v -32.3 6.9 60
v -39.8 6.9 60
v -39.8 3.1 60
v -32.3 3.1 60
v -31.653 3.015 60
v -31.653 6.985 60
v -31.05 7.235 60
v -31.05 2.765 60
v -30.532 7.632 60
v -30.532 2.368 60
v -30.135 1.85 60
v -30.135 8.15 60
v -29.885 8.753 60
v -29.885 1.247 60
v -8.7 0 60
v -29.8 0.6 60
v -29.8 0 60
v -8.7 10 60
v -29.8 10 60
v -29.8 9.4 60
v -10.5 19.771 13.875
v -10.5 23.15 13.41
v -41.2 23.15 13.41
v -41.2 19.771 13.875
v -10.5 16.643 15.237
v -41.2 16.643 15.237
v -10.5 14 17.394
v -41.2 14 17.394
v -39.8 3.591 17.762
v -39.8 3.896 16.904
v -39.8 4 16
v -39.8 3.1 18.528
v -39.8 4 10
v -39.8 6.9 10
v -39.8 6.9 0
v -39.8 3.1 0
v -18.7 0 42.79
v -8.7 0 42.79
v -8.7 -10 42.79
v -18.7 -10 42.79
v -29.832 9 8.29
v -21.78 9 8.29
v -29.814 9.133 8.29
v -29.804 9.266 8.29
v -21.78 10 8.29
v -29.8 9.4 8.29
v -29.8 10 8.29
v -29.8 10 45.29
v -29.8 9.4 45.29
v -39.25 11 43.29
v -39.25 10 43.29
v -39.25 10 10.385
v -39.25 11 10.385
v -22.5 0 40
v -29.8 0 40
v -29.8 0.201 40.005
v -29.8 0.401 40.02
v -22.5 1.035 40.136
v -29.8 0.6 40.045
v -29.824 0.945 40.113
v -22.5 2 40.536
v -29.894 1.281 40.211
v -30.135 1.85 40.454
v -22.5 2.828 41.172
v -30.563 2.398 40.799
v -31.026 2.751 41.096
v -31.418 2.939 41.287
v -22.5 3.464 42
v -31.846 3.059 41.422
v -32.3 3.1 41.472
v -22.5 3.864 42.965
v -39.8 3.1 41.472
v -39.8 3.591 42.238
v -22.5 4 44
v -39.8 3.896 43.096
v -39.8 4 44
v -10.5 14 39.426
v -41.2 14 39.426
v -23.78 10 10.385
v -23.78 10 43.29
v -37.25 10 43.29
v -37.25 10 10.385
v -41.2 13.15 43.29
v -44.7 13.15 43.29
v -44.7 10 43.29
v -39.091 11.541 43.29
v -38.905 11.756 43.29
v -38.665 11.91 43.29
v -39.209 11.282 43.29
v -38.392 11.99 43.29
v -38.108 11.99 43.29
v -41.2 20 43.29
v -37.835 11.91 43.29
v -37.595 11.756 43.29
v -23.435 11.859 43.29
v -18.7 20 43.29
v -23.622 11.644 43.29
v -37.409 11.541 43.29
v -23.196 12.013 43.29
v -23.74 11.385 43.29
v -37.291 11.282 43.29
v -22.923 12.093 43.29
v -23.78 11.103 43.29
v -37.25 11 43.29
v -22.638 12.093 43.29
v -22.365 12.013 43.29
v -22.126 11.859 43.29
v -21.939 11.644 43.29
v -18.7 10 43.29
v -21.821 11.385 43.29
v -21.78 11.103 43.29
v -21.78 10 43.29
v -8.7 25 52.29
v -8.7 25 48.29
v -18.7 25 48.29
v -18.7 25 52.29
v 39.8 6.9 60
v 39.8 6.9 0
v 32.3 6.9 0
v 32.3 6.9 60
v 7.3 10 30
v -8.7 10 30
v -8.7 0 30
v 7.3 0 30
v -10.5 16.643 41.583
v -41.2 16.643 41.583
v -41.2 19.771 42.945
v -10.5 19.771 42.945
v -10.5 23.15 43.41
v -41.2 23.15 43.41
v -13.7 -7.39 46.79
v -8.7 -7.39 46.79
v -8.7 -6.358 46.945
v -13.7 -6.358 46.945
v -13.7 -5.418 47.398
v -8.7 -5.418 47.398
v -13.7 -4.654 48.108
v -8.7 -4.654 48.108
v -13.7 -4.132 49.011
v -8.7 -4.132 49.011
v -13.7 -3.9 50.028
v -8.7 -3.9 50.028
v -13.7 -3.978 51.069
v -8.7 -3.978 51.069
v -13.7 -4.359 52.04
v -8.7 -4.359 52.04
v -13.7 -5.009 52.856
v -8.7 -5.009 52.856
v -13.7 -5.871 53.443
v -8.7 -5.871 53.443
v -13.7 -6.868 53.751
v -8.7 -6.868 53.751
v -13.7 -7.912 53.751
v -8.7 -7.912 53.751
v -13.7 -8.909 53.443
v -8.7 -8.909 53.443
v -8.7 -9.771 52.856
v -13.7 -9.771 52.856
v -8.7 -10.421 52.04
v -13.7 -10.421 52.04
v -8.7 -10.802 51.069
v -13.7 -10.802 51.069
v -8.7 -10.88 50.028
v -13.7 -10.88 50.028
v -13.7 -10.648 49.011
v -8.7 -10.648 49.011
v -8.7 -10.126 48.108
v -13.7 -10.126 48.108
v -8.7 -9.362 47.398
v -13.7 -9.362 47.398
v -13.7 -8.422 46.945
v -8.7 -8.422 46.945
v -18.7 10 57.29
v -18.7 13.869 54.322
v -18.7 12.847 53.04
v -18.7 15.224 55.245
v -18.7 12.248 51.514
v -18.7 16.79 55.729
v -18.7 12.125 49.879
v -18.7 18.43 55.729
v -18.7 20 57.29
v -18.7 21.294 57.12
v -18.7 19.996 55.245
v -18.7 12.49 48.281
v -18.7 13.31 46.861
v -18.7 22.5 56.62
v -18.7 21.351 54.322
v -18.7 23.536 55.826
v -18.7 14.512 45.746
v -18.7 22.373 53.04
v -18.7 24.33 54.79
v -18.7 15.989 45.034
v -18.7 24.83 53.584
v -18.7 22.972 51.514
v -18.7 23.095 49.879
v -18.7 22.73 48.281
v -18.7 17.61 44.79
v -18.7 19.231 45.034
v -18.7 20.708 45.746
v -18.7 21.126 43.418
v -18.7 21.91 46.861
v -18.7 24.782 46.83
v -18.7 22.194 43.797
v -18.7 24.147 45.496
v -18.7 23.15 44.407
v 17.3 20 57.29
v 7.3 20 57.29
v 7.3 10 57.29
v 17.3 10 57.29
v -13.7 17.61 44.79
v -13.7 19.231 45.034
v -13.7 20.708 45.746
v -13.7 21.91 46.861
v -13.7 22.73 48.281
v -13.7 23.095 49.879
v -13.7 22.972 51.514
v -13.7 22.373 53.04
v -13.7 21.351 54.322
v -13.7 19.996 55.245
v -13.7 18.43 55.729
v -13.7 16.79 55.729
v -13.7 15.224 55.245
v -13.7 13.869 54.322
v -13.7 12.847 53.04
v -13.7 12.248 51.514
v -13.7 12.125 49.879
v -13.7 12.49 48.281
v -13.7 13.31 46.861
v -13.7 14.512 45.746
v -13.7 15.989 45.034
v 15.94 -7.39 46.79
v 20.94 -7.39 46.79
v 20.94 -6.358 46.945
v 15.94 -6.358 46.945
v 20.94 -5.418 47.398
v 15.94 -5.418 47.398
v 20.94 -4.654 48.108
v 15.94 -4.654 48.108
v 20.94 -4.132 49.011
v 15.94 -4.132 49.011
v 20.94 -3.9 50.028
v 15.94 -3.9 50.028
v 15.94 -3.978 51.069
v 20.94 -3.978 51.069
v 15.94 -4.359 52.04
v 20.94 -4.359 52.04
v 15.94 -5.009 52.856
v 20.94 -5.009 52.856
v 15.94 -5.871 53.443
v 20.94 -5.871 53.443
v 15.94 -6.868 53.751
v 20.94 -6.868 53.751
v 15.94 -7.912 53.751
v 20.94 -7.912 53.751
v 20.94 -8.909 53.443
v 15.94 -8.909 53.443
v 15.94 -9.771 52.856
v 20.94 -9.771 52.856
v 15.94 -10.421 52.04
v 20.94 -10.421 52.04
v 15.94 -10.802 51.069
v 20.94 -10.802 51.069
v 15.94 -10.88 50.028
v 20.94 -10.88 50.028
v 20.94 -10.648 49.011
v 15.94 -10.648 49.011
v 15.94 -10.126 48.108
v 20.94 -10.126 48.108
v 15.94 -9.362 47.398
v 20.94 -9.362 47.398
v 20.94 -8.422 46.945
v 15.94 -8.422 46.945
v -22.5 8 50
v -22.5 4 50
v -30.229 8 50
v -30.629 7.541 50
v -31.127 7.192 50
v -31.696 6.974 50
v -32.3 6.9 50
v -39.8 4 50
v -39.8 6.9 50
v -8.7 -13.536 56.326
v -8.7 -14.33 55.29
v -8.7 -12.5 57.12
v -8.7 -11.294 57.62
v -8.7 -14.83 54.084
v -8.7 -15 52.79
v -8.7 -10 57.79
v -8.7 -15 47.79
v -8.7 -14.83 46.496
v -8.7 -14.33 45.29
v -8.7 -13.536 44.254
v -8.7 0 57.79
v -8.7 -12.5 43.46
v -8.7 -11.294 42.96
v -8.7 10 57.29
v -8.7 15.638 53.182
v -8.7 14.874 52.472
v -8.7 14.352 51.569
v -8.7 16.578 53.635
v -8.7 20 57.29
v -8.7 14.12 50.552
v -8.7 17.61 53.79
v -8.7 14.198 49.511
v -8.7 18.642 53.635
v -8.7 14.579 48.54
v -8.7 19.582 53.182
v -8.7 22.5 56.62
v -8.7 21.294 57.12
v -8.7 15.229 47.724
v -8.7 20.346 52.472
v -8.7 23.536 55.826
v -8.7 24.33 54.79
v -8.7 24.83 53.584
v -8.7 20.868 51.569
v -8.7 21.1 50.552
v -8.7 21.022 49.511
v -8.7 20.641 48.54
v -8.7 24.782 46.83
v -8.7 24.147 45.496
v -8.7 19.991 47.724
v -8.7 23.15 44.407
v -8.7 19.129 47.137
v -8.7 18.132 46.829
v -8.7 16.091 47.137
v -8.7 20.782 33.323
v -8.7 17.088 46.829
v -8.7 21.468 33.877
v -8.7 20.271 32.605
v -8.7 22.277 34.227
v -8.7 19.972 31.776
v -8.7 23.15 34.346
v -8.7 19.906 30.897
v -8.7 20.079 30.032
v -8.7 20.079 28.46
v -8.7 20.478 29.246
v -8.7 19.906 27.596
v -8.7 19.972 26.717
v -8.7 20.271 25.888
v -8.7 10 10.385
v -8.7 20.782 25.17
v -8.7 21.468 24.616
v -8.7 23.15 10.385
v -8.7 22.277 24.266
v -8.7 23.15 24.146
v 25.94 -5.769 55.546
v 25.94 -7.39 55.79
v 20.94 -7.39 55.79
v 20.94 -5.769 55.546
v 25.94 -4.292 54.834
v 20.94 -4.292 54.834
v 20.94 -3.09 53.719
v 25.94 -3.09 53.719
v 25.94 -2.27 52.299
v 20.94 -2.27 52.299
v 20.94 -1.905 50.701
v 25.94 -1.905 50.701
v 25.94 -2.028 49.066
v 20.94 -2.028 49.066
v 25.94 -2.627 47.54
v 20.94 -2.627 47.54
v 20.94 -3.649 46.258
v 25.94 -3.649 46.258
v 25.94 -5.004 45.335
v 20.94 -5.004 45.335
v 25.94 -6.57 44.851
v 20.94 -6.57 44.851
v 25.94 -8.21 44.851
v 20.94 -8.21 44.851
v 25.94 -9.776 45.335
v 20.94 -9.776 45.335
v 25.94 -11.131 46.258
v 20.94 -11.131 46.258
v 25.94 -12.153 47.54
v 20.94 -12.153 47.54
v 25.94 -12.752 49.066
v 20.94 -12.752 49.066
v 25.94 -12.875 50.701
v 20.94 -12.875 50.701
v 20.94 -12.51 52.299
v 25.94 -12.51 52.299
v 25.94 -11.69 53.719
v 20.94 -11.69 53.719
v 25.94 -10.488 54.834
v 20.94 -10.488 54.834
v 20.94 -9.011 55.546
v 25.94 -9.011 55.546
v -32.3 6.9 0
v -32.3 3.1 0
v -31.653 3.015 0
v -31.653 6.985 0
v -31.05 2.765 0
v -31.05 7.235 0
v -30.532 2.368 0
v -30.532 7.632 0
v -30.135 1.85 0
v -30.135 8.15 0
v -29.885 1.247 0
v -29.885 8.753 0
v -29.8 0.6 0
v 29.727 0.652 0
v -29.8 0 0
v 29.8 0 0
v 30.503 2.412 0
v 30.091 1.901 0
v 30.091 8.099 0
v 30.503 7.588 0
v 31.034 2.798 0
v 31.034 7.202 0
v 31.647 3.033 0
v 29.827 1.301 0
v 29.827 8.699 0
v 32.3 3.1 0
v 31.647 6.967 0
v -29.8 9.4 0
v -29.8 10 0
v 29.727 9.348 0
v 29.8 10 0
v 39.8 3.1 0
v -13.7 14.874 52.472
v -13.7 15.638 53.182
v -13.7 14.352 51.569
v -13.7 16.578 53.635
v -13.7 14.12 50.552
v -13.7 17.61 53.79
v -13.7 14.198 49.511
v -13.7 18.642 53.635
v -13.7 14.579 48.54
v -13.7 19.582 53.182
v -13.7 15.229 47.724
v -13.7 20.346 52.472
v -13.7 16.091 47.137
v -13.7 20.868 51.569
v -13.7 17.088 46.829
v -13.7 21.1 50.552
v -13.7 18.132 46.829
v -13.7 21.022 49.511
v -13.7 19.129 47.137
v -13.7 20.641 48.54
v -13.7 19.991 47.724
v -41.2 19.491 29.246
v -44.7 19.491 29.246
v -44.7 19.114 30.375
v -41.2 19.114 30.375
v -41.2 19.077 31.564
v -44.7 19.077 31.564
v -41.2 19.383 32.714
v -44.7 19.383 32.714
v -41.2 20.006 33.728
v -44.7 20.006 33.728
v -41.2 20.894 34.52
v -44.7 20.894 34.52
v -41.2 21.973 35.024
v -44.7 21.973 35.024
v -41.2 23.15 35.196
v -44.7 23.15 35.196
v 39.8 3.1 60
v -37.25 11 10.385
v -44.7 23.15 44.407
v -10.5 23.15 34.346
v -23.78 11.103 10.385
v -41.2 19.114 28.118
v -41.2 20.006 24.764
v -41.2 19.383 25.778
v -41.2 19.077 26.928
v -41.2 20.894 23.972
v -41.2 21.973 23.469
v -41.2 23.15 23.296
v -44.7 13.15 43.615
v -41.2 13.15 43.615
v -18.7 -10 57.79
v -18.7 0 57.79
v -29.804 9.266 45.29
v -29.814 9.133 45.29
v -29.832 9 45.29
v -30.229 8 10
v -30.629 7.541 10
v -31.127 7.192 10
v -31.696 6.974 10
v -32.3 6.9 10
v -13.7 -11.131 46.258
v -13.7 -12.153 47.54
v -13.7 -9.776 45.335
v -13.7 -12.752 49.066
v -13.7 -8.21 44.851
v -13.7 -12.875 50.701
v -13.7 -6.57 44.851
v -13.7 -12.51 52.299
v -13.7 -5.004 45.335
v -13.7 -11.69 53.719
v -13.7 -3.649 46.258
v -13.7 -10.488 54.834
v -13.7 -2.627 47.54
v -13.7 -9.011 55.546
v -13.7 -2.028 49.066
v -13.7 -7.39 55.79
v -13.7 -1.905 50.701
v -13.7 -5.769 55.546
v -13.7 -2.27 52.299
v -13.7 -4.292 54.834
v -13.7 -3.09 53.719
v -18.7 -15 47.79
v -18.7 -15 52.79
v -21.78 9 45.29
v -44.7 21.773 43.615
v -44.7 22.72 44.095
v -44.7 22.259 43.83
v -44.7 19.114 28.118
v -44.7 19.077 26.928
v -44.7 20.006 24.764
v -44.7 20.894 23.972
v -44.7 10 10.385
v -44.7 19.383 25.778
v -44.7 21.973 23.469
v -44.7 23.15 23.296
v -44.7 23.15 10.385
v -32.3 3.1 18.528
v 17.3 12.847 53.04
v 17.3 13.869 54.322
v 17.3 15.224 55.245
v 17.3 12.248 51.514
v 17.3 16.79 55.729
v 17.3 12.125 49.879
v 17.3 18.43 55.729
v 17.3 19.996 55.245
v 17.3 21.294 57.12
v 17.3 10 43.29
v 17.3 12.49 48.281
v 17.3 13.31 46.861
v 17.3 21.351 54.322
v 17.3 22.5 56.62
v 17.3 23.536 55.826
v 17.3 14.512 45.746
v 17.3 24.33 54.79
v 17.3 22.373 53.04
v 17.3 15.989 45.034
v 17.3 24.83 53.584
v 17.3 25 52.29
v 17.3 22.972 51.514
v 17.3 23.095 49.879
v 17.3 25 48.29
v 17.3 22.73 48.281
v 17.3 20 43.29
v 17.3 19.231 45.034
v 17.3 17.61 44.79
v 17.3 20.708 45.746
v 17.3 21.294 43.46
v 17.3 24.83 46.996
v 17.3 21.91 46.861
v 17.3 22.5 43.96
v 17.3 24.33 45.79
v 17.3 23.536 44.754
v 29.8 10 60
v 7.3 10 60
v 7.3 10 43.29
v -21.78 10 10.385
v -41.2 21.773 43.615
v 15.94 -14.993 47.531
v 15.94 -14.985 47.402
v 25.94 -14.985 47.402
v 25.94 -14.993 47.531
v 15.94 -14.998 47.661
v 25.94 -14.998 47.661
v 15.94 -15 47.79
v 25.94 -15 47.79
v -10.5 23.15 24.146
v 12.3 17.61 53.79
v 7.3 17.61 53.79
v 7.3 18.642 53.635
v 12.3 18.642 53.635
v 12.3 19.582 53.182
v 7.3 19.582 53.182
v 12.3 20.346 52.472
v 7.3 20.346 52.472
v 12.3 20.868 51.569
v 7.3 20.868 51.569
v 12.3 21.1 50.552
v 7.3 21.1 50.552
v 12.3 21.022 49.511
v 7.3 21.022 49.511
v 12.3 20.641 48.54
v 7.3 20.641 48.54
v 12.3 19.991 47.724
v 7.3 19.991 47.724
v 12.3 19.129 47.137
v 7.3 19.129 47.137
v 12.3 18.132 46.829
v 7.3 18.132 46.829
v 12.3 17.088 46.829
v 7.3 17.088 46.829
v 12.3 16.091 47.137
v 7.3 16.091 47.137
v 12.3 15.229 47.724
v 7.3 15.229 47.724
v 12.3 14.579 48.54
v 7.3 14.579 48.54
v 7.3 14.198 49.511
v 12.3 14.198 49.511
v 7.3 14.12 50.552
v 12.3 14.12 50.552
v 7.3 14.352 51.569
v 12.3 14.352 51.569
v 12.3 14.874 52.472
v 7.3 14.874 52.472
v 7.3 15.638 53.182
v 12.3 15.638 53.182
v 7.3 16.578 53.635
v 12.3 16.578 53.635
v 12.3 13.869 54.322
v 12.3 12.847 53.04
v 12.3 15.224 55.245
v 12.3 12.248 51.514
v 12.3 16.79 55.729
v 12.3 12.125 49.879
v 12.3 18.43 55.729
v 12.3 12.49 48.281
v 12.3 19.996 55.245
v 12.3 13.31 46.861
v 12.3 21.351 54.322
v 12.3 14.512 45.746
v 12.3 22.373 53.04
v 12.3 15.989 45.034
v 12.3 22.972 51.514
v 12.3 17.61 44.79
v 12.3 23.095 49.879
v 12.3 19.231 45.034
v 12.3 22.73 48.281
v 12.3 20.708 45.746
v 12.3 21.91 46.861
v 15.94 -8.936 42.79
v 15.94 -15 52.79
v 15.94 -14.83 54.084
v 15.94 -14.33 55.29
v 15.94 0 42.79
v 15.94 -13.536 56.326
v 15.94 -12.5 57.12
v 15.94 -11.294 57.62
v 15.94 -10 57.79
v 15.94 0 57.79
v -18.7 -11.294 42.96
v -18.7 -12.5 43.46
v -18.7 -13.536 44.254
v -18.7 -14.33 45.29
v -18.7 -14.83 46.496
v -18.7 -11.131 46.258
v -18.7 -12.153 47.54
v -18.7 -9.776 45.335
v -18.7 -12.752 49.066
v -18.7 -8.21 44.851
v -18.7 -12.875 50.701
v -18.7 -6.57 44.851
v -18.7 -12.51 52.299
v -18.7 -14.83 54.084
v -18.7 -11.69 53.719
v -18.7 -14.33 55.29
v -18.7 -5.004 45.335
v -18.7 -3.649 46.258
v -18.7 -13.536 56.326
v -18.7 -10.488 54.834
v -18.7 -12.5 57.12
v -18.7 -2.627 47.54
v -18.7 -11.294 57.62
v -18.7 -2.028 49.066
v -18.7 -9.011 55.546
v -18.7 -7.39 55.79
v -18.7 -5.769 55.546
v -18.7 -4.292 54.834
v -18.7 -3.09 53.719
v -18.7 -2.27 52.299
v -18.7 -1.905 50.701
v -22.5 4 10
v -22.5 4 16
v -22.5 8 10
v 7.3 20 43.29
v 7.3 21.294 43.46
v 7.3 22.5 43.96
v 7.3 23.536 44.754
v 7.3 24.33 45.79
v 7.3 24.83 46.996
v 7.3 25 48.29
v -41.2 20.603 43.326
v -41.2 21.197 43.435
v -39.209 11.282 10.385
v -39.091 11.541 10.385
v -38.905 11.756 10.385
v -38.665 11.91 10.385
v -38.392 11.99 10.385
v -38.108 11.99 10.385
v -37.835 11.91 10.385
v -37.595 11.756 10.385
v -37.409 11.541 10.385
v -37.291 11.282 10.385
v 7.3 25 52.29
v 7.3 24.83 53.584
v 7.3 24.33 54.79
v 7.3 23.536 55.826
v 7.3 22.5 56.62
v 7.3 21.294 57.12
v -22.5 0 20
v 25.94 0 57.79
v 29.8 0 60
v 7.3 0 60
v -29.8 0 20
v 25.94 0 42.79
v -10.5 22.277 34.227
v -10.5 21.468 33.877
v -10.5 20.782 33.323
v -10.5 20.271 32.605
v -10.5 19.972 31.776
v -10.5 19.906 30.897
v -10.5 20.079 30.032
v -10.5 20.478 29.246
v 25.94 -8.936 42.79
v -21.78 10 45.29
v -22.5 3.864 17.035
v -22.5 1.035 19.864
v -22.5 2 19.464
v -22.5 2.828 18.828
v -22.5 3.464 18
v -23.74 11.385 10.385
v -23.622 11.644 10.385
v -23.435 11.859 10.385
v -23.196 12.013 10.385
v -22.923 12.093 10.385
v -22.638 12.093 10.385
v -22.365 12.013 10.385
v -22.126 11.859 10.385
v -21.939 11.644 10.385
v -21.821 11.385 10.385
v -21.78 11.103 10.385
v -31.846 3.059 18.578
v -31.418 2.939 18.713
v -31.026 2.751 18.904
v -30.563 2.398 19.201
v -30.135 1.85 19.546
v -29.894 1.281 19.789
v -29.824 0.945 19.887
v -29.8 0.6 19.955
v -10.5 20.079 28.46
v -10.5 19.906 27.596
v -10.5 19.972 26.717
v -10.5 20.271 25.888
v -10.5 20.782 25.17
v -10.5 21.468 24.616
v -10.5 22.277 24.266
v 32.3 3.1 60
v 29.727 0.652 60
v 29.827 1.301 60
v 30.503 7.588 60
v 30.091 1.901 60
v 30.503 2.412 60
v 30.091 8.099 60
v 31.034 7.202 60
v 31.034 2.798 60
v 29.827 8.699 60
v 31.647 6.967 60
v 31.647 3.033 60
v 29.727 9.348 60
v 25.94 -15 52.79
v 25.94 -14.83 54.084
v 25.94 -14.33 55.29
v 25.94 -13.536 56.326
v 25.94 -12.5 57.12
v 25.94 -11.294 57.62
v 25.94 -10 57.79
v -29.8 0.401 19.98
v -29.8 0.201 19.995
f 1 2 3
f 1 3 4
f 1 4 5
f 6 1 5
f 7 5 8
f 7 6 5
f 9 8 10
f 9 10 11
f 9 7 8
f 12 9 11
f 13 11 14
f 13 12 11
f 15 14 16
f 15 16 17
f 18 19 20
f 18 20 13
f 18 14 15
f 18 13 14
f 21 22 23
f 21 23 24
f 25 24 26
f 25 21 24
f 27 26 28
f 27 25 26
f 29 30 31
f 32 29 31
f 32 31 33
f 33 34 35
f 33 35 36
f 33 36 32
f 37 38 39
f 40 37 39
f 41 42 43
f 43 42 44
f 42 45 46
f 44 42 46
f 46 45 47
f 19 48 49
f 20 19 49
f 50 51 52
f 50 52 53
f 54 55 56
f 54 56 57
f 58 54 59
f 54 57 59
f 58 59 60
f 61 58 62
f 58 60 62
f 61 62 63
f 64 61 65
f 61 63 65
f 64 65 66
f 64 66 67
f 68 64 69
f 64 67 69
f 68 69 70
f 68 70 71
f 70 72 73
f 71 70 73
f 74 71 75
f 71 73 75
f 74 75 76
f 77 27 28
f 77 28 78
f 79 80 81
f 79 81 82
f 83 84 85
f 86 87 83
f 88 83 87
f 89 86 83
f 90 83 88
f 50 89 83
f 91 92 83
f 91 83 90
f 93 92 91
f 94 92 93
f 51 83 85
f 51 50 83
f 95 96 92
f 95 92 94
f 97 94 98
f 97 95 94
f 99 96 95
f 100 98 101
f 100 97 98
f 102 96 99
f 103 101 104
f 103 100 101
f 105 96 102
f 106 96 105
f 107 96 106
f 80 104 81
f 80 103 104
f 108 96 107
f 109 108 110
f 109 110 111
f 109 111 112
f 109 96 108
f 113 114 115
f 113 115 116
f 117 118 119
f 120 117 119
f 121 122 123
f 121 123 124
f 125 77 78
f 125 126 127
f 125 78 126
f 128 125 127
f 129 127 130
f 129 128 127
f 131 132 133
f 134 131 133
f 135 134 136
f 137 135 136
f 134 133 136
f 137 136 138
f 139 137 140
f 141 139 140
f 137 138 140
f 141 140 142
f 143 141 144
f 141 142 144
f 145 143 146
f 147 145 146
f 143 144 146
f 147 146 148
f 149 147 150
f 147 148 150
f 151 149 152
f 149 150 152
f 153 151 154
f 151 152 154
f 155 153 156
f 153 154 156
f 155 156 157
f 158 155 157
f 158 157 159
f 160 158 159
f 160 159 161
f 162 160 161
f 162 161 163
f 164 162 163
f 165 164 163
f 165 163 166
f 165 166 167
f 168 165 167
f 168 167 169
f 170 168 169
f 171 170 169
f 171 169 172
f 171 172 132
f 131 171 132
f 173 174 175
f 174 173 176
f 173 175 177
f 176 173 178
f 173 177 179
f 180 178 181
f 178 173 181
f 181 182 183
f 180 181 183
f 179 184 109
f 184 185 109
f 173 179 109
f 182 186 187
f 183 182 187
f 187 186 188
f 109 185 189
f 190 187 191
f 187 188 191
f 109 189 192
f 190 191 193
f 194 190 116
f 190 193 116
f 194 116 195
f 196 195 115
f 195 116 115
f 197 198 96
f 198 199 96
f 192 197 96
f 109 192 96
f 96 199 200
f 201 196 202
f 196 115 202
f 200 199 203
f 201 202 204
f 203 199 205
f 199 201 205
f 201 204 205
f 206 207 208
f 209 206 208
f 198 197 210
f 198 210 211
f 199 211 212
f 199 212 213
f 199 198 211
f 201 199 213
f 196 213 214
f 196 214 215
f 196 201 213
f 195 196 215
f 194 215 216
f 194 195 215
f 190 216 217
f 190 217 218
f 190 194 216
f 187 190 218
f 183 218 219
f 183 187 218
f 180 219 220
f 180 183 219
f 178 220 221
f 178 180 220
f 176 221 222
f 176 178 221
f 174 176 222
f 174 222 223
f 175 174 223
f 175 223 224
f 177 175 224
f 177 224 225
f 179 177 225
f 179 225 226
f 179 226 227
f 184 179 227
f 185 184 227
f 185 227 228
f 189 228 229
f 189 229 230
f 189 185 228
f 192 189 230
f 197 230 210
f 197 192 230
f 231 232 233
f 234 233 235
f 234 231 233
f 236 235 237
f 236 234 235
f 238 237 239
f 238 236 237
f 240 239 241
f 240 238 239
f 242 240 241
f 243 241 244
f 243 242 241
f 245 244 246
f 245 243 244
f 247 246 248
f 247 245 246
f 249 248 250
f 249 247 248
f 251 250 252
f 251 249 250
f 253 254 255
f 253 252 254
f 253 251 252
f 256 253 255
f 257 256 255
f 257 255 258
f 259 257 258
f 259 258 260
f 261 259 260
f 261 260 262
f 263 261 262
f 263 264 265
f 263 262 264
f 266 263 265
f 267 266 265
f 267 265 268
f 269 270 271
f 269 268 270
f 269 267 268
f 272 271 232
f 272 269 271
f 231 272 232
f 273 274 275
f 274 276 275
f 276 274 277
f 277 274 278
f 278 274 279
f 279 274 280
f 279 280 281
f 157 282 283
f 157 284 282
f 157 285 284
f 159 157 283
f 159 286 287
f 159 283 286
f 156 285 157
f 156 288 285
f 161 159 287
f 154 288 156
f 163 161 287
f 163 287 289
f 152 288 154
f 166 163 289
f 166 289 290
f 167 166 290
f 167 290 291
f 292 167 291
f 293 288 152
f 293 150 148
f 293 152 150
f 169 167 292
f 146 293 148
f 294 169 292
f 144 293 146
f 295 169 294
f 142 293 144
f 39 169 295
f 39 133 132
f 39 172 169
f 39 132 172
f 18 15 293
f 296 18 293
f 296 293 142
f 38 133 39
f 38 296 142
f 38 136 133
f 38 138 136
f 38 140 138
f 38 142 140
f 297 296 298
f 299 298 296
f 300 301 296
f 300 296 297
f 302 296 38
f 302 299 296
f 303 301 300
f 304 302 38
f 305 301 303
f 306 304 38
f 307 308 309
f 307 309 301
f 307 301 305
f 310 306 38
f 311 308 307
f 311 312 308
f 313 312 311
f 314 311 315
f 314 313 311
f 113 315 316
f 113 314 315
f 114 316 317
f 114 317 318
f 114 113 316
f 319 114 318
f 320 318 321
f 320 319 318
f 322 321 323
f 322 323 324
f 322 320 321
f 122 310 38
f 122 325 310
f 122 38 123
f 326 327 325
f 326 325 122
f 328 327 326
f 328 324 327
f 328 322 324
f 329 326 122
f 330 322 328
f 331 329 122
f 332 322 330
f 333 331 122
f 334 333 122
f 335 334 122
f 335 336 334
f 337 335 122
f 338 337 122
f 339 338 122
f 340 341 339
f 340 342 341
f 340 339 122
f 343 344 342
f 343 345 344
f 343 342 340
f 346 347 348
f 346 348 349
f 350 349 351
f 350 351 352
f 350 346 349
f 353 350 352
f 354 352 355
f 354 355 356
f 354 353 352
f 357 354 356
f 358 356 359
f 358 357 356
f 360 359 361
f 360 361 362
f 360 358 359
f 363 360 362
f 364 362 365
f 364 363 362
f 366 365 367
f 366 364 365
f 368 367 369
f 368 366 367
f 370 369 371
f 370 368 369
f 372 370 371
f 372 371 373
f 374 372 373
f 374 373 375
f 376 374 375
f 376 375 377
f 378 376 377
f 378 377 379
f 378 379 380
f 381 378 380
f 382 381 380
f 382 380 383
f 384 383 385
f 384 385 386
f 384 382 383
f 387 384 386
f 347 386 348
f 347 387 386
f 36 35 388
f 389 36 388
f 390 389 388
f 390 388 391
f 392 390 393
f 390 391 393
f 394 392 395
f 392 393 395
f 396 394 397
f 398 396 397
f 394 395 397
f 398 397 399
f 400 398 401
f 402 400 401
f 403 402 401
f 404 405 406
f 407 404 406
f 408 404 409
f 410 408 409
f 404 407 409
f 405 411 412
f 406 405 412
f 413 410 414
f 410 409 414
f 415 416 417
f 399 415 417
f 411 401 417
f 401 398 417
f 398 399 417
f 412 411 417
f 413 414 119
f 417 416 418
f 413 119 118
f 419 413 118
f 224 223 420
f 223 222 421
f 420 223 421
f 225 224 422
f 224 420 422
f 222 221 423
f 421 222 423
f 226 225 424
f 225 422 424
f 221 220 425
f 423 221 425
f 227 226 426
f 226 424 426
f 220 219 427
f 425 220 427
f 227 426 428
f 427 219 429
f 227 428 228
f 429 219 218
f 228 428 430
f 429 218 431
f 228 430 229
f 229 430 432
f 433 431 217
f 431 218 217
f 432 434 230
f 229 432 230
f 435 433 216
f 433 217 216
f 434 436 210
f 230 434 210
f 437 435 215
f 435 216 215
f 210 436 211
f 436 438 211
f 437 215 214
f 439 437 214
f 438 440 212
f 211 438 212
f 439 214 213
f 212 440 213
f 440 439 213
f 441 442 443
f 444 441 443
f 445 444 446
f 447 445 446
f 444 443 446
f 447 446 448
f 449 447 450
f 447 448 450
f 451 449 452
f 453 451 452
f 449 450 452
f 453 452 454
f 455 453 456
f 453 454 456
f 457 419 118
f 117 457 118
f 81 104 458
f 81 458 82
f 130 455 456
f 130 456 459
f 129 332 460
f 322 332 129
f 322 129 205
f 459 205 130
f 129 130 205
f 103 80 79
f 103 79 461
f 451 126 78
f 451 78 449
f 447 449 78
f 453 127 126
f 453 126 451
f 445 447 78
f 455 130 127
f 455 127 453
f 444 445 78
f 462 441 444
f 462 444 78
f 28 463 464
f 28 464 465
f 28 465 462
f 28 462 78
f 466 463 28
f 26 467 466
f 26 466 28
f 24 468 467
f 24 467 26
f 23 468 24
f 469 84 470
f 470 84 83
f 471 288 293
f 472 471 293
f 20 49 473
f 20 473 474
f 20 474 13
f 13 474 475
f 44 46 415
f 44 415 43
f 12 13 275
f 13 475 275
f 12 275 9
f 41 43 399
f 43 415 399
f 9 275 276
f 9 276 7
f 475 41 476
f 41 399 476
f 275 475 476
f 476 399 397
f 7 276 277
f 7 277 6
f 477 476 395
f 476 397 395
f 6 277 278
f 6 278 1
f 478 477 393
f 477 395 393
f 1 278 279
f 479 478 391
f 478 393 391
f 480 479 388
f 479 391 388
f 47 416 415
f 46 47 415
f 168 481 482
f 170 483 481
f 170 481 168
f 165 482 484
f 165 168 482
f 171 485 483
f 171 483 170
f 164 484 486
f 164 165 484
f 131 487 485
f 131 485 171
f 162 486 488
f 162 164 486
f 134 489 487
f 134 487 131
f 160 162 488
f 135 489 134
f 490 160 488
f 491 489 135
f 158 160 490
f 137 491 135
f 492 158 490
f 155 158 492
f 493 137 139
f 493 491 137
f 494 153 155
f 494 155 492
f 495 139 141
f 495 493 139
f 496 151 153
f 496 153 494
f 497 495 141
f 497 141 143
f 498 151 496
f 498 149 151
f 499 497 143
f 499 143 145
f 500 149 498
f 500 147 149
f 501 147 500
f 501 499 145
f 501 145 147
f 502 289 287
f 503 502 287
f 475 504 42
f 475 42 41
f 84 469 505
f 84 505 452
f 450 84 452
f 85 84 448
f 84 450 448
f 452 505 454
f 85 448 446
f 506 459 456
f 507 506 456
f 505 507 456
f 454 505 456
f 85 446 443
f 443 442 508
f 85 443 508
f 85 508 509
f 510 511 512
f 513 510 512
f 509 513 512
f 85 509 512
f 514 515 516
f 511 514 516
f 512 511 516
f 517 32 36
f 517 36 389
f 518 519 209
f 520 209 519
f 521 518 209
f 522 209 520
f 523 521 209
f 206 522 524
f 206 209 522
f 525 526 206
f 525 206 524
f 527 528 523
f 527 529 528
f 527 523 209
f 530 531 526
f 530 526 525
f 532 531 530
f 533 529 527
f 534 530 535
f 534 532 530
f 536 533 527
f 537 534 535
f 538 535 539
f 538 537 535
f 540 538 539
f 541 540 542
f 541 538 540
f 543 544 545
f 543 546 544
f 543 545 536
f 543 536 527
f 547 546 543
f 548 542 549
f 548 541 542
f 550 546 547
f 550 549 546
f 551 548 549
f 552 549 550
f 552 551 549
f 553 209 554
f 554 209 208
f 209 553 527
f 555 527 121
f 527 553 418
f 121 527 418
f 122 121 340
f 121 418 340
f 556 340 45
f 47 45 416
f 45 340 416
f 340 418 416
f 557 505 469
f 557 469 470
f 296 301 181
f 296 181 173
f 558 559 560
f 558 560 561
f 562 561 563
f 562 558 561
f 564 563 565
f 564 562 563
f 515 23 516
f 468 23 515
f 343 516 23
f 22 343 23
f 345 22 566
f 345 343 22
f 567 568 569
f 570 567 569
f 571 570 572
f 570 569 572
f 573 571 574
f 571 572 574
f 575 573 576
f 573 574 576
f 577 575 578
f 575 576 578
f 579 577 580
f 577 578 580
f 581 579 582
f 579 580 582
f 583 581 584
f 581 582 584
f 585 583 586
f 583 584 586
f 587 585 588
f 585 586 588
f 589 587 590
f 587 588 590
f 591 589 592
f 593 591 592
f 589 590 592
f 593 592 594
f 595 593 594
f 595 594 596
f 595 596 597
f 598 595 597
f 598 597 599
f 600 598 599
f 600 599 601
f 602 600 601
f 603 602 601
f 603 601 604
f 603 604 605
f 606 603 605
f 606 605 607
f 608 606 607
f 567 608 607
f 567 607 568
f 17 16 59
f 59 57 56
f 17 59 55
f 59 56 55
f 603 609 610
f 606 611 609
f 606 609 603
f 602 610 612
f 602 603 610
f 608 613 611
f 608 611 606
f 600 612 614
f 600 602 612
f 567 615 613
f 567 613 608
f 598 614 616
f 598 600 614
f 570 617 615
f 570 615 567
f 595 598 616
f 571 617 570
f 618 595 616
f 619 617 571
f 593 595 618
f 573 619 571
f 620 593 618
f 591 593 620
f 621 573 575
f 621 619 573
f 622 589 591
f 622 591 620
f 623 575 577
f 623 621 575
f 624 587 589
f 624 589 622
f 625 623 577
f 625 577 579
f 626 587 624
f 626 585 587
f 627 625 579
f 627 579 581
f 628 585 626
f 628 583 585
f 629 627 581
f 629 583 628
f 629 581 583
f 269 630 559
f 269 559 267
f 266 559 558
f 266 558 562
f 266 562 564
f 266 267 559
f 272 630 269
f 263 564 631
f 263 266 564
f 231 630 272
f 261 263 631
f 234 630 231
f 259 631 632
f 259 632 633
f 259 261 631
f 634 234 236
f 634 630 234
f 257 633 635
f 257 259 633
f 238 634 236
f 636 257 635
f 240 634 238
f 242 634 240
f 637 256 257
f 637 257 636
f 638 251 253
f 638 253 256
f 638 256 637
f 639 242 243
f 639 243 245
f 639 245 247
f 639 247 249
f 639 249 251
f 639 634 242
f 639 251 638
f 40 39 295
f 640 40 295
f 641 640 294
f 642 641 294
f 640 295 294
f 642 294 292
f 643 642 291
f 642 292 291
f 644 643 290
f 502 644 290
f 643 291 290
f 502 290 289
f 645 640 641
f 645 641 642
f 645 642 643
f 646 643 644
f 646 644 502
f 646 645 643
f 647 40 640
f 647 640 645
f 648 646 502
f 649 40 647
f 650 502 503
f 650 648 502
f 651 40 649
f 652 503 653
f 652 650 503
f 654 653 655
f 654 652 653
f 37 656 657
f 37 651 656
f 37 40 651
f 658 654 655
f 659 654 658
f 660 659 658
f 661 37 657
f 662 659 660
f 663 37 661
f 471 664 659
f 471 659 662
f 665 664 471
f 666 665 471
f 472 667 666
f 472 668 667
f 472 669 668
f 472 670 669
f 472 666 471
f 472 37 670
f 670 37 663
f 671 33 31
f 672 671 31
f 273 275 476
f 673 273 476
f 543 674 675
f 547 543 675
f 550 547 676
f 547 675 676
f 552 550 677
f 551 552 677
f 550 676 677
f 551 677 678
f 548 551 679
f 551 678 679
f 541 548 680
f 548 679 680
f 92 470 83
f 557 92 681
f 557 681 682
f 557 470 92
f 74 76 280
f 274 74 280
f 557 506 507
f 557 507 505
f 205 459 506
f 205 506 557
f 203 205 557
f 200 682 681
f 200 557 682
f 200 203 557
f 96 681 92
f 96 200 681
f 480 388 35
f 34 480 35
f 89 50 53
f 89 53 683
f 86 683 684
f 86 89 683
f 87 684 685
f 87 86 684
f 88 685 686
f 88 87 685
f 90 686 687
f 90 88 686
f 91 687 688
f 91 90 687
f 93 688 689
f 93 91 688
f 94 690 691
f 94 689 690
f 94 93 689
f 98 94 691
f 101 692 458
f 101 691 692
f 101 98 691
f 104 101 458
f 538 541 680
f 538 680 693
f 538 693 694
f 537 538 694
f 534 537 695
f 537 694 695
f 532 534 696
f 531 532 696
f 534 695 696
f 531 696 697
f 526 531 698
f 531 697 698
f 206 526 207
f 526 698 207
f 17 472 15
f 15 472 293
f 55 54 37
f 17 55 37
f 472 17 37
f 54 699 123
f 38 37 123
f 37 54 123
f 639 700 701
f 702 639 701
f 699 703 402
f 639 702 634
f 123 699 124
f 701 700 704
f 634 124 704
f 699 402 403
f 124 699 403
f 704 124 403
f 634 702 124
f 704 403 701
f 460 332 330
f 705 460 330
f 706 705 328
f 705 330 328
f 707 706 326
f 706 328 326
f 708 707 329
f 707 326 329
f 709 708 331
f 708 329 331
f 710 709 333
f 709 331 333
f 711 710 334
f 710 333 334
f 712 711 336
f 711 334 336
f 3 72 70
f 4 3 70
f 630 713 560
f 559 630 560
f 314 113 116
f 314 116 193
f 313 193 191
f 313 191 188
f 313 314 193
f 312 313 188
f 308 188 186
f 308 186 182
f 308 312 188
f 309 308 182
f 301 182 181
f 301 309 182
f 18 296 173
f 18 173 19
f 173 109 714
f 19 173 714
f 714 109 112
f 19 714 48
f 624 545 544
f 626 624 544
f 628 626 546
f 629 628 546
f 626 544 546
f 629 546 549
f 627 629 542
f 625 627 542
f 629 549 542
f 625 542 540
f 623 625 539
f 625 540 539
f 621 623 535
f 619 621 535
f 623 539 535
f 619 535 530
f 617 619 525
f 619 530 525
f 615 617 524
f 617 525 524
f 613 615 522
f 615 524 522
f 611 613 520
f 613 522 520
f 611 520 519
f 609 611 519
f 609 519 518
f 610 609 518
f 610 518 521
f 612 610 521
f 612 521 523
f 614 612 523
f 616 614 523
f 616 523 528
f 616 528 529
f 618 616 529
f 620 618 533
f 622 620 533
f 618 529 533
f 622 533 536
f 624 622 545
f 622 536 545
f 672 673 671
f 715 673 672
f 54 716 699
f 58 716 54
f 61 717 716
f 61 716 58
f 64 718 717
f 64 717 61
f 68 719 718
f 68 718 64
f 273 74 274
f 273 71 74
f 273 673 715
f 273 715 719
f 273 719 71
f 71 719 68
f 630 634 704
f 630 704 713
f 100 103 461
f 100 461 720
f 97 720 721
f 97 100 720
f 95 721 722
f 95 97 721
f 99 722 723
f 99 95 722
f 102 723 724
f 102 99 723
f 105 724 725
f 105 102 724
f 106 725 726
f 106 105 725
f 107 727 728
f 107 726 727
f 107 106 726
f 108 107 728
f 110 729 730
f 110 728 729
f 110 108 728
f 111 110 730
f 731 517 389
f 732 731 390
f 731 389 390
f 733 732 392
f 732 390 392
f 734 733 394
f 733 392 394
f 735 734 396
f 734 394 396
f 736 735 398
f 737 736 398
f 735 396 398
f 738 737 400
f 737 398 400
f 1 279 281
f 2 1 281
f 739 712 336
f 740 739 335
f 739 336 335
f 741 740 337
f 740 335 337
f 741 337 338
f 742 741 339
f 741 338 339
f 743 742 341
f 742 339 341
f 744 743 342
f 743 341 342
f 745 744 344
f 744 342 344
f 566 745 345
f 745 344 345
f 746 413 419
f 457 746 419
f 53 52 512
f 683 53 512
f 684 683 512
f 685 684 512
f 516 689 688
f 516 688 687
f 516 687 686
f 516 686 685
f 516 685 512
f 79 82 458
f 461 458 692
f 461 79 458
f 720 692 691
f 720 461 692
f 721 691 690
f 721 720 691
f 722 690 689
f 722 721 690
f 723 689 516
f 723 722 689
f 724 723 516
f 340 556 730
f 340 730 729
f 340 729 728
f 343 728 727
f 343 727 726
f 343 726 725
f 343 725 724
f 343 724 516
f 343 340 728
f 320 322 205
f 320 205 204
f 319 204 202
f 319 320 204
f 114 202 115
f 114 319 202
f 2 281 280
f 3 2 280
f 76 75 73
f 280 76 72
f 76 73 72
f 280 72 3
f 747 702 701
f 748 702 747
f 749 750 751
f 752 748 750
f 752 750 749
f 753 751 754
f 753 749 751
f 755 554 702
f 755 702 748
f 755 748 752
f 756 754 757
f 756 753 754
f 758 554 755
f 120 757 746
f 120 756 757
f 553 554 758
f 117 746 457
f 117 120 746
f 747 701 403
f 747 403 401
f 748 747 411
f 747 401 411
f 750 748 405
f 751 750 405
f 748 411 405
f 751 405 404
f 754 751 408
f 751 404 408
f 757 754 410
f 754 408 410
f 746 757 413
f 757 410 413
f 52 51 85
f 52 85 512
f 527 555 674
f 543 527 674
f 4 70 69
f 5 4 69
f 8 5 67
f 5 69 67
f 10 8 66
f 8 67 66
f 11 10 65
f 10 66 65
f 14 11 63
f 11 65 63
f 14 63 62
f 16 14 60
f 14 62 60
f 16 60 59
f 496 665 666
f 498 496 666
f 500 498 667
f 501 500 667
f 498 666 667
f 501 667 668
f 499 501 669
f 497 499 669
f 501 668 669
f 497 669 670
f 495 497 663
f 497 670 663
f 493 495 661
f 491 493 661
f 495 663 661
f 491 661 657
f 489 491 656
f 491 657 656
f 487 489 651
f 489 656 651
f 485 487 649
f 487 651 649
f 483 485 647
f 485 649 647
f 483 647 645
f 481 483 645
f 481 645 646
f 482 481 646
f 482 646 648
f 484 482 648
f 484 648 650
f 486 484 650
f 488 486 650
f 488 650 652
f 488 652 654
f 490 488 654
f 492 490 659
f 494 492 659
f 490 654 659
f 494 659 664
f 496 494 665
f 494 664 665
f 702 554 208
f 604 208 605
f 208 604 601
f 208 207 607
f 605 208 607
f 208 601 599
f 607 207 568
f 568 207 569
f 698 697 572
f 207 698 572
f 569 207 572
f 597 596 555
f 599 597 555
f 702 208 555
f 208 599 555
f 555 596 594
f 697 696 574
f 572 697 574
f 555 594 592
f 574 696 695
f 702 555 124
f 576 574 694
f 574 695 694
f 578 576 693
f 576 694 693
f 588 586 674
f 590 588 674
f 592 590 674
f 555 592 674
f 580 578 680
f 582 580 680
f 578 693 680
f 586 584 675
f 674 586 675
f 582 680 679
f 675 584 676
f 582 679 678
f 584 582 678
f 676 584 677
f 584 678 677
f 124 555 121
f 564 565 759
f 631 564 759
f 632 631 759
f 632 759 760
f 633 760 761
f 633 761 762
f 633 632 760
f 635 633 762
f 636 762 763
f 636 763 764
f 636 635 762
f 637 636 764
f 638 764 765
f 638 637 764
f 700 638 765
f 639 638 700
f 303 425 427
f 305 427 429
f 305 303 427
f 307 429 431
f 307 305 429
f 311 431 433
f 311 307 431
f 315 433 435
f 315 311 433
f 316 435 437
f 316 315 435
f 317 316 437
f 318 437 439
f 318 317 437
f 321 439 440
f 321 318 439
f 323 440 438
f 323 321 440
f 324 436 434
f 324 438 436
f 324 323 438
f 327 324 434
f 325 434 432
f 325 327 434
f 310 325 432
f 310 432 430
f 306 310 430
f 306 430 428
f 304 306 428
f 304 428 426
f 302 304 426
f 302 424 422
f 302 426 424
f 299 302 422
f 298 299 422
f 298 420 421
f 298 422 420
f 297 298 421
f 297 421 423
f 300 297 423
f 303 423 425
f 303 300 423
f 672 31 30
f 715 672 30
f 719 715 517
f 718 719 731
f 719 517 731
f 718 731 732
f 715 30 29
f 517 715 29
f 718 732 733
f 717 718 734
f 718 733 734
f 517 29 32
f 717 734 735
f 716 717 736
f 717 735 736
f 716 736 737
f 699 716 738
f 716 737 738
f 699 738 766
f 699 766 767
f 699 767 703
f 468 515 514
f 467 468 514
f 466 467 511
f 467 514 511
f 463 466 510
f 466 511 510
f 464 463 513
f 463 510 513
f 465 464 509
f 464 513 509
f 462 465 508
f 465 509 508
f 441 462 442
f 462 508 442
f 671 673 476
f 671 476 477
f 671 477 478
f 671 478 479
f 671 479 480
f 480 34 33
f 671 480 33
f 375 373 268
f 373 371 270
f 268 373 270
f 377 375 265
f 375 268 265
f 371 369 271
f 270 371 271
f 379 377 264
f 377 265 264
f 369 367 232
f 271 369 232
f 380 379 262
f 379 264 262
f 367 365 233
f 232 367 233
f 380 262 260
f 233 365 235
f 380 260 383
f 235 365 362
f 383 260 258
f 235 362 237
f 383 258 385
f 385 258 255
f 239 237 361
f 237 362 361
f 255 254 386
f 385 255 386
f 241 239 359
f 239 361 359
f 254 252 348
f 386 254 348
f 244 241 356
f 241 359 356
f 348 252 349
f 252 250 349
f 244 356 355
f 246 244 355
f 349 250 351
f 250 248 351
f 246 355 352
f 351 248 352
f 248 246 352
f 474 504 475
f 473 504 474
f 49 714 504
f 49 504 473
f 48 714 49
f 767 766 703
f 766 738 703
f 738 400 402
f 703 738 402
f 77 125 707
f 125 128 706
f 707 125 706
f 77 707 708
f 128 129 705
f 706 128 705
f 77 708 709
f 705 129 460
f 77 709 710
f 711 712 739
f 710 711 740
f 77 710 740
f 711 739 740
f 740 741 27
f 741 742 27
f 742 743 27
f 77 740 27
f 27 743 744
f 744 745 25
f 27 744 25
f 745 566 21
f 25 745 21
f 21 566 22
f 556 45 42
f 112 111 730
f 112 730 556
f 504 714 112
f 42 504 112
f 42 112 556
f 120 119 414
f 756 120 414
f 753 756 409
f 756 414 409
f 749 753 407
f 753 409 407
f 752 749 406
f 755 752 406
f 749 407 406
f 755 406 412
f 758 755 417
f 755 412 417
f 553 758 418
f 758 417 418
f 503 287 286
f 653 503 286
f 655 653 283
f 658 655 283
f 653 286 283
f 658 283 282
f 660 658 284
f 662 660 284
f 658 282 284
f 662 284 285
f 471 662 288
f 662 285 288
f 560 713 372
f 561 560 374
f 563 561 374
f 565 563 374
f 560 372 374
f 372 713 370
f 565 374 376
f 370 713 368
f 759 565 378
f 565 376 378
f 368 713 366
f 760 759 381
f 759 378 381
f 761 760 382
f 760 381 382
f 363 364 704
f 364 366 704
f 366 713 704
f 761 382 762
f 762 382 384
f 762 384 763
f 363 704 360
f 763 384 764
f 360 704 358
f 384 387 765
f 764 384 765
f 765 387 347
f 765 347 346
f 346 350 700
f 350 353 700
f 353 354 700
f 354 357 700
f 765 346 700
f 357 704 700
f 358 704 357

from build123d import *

# Parameters (mm, degrees)
EXTRUDE_1_DEPTH          = 60
CUT_EXTRUDE_1_DEPTH      = 17.3
SKETCH1_W                = 16
SKETCH1_H                = 30
CUT_EXTRUDE1_DEPTH       = 10
SKETCH2_R                = 3.5
BOSS_EXTRUDE1_DEPTH      = 10
SKETCH4_R                = 5.5
CUT_EXTRUDE4_DEPTH       = 5
SKETCH5_R                = 3.5
BOSS_EXTRUDE2_DEPTH      = 10
SKETCH6_R                = 5.5
CUT_EXTRUDE5_DEPTH       = 5
BOSS_EXTRUDE4_DEPTH      = 36
SKETCH8_W                = 1.8
SKETCH8_H                = 30.375385669
SKETCH8_W_2              = 3.5
SKETCH8_H_2              = 30.204879213
BOSS_EXTRUDE5_DEPTH      = 10
CUT_EXTRUDE6_DEPTH       = 10
CUT_EXTRUDE7_DEPTH       = 10
CUT_EXTRUDE8_DEPTH       = 68.060525711
CUT_EXTRUDE9_DEPTH       = 10
CUT_EXTRUDE10_DEPTH      = 2
CUT_EXTRUDE10_DEPTH_BACK = 35


with BuildPart() as part:
    # 스케치1 → 보스-돌출1 (new body)
    with BuildSketch(Plane.XY):
        with BuildLine():
            Line((29.8, 10), (-29.8, 10))
            Line((-29.8, 10), (-29.8, 9.4))
            ThreePointArc((-29.8, 9.4), (-30.532233047, 7.632233047), (-32.3, 6.9))
            Line((-32.3, 6.9), (-39.8, 6.9))
            Line((-39.8, 6.9), (-39.8, 3.1))
            Line((-39.8, 3.1), (-32.3, 3.1))
            ThreePointArc((-32.3, 3.1), (-30.532233047, 2.367766953), (-29.8, 0.6))
            Line((-29.8, 0.6), (-29.8, 0))
            Line((-29.8, 0), (29.8, 0))
            ThreePointArc((29.8, 0), (30.280633401, 2.170456935), (32.3, 3.1))
            Line((32.3, 3.1), (39.8, 3.1))
            Line((39.8, 3.1), (39.8, 6.9))
            Line((39.8, 6.9), (32.3, 6.9))
            ThreePointArc((32.3, 6.9), (30.280633401, 7.829543065), (29.8, 10))
        make_face()
    extrude(amount=EXTRUDE_1_DEPTH)

    # 스케치2 → 컷-돌출1 (cut)
    with BuildSketch(Plane.ZY.offset(39.8)):
        with BuildLine():
            Line((44, 4), (50, 4))
            Line((50, 4), (50, 8))
            Line((50, 8), (10, 8))
            Line((10, 8), (10, 4))
            Line((10, 4), (16, 4))
            ThreePointArc((16, 4), (18.828427125, 2.828427125), (20, 0))
            Line((20, 0), (40, 0))
            ThreePointArc((40, 0), (41.171572875, 2.828427125), (44, 4))
        make_face()
    extrude(amount=-CUT_EXTRUDE_1_DEPTH, mode=Mode.SUBTRACT)

    # Sketch1 → Cut-Extrude1 (cut)
    with BuildSketch(Plane(origin=(0, 10, 0), x_dir=(1, 0, 0), z_dir=(0, 1, 0))):
        with Locations((-0.7, -45)):
            Rectangle(SKETCH1_W, SKETCH1_H)
    extrude(amount=-CUT_EXTRUDE1_DEPTH, mode=Mode.SUBTRACT)

    # Sketch2 → Boss-Extrude1 (add)
    with BuildSketch(Plane.ZY.offset(-7.3)):
        with BuildLine():
            Line((57.29, 10), (43.29, 10))
            Line((43.29, 10), (43.29, 20))
            ThreePointArc((43.29, 20), (44.754466094, 23.535533906), (48.29, 25))
            Line((48.29, 25), (52.29, 25))
            ThreePointArc((52.29, 25), (55.825533906, 23.535533906), (57.29, 20))
            Line((57.29, 20), (57.29, 10))
        make_face()
        with Locations((50.29, 17.61)):
            Circle(SKETCH2_R, mode=Mode.SUBTRACT)
    boss_extrude1 = extrude(amount=-BOSS_EXTRUDE1_DEPTH)

    # Sketch4 → Cut-Extrude4 (cut)
    with BuildSketch(Plane(origin=(17.3, 0, 0), x_dir=(0, 0, -1), z_dir=(1, 0, 0))):
        with Locations((-50.29, 17.61)):
            Circle(SKETCH4_R)
    cut_extrude4 = extrude(amount=-CUT_EXTRUDE4_DEPTH, mode=Mode.SUBTRACT)

    # Mirror1: Boss-Extrude1, Cut-Extrude4 across plane
    add(boss_extrude1.mirror(Plane.ZY.offset(0.7)))
    add(cut_extrude4.mirror(Plane.ZY.offset(0.7)), mode=Mode.SUBTRACT)

    # Sketch5 → Boss-Extrude2 (add)
    with BuildSketch(Plane(origin=(-8.7, 0, 0), x_dir=(0, 0, -1), z_dir=(1, 0, 0))):
        with BuildLine():
            Line((-57.79, 0), (-42.79, 0))
            Line((-42.79, 0), (-42.79, -10))
            ThreePointArc((-42.79, -10), (-44.254466094, -13.535533906), (-47.79, -15))
            Line((-47.79, -15), (-52.79, -15))
            ThreePointArc((-52.79, -15), (-56.325533906, -13.535533906), (-57.79, -10))
            Line((-57.79, -10), (-57.79, 0))
        make_face()
        with Locations((-50.29, -7.39000045)):
            Circle(SKETCH5_R, mode=Mode.SUBTRACT)
    boss_extrude2 = extrude(amount=-BOSS_EXTRUDE2_DEPTH)

    # Sketch6 → Cut-Extrude5 (cut)
    with BuildSketch(Plane.ZY.offset(18.7)):
        with Locations((50.29, -7.39000045)):
            Circle(SKETCH6_R)
    cut_extrude5 = extrude(amount=-CUT_EXTRUDE5_DEPTH, mode=Mode.SUBTRACT)

    # Mirror2: Boss-Extrude2, Cut-Extrude5 across plane
    add(boss_extrude2.mirror(Plane(origin=(3.62, 0, 0), x_dir=(0, 0, 1), z_dir=(1, 0, 0))))
    add(cut_extrude5.mirror(Plane(origin=(3.62, 0, 0), x_dir=(0, 0, 1), z_dir=(1, 0, 0))), mode=Mode.SUBTRACT)

    # Sketch7 → Boss-Extrude4 (add)
    with BuildSketch(Plane(origin=(-8.7, 0, 0), x_dir=(0, 0, -1), z_dir=(1, 0, 0))):
        with BuildLine():
            Line((-17.393692115, 14), (-39.426307885, 14))
            ThreePointArc((-39.426307885, 14), (-42.370886715, 18.160202838), (-43.41, 23.15))
            Line((-43.41, 23.15), (-44.407024337, 23.15))
            ThreePointArc((-44.407024337, 23.15), (-43.577523034, 21.671095701), (-43.29, 20))
            Line((-43.29, 20), (-43.29, 10))
            Line((-43.29, 10), (-30, 10))
            Line((-30, 10), (-10.385441698, 10))
            Line((-10.385441698, 10), (-10.385441698, 23.15))
            Line((-10.385441698, 23.15), (-13.41, 23.15))
            ThreePointArc((-13.41, 23.15), (-14.449113285, 18.160202838), (-17.393692115, 14))
        make_face()
    extrude(amount=-BOSS_EXTRUDE4_DEPTH)

    # Sketch8 → Boss-Extrude5 (add)
    with BuildSketch(Plane(origin=(0, 23.15, 0), x_dir=(1, 0, 0), z_dir=(0, 1, 0))):
        with Locations((-9.6, -28.597692835)):
            Rectangle(SKETCH8_W, SKETCH8_H)
        with Locations((-42.95, -28.512439607)):
            Rectangle(SKETCH8_W_2, SKETCH8_H_2)
    extrude(amount=-BOSS_EXTRUDE5_DEPTH)

    # Sketch9 → Cut-Extrude6 (cut)
    with BuildSketch(Plane(origin=(-8.7, 0, 0), x_dir=(0, 0, -1), z_dir=(1, 0, 0))):
        with BuildLine():
            Line((-27.846233017, 23.15), (-24.146233017, 23.15))
            ThreePointArc((-24.146233017, 23.15), (-25.887922704, 26.028801834), (-29.246233017, 25.822077843))
            ThreePointArc((-29.246233017, 25.822077843), (-28.217431183, 24.658310313), (-27.846233017, 23.15))
        make_face()
        with BuildLine():
            ThreePointArc((-29.246233017, 20.477922157), (-25.887922704, 20.271198166), (-24.146233017, 23.15))
            Line((-24.146233017, 23.15), (-27.846233017, 23.15))
            ThreePointArc((-27.846233017, 23.15), (-28.217431183, 21.641689687), (-29.246233017, 20.477922157))
        make_face()
        with BuildLine():
            ThreePointArc((-27.846233017, 23.15), (-28.217431183, 24.658310313), (-29.246233017, 25.822077843))
            ThreePointArc((-29.246233017, 25.822077843), (-30.275034851, 24.658310313), (-30.646233017, 23.15))
            Line((-30.646233017, 23.15), (-27.846233017, 23.15))
        make_face()
        with BuildLine():
            ThreePointArc((-30.646233017, 23.15), (-30.275034851, 24.658310313), (-29.246233017, 25.822077843))
            ThreePointArc((-29.246233017, 25.822077843), (-32.60454333, 26.028801834), (-34.346233017, 23.15))
            Line((-34.346233017, 23.15), (-30.646233017, 23.15))
        make_face()
        with BuildLine():
            ThreePointArc((-34.346233017, 23.15), (-32.60454333, 20.271198166), (-29.246233017, 20.477922157))
            ThreePointArc((-29.246233017, 20.477922157), (-30.275034851, 21.641689687), (-30.646233017, 23.15))
            Line((-30.646233017, 23.15), (-34.346233017, 23.15))
        make_face()
        with BuildLine():
            ThreePointArc((-30.646233017, 23.15), (-30.275034851, 21.641689687), (-29.246233017, 20.477922157))
            ThreePointArc((-29.246233017, 20.477922157), (-28.217431183, 21.641689687), (-27.846233017, 23.15))
            Line((-27.846233017, 23.15), (-30.646233017, 23.15))
        make_face()
    extrude(amount=-CUT_EXTRUDE6_DEPTH, mode=Mode.SUBTRACT)

    # Sketch10 → Cut-Extrude7 (cut)
    with BuildSketch(Plane.ZY.offset(44.7)):
        with BuildLine():
            Line((26.996233017, 23.15), (31.496233017, 23.15))
            ThreePointArc((31.496233017, 23.15), (30.888724964, 25.297673159), (29.246233017, 26.808893275))
            ThreePointArc((29.246233017, 26.808893275), (27.60374107, 25.297673159), (26.996233017, 23.15))
        make_face()
        with BuildLine():
            Line((35.196233017, 23.15), (31.496233017, 23.15))
            ThreePointArc((31.496233017, 23.15), (30.888724964, 21.002326841), (29.246233017, 19.491106725))
            ThreePointArc((29.246233017, 19.491106725), (33.243906177, 19.657508053), (35.196233017, 23.15))
        make_face()
        with BuildLine():
            ThreePointArc((29.246233017, 26.808893275), (30.888724964, 25.297673159), (31.496233017, 23.15))
            Line((31.496233017, 23.15), (35.196233017, 23.15))
            ThreePointArc((35.196233017, 23.15), (33.243906177, 26.642491947), (29.246233017, 26.808893275))
        make_face()
        with BuildLine():
            ThreePointArc((29.246233017, 19.491106725), (30.888724964, 21.002326841), (31.496233017, 23.15))
            Line((31.496233017, 23.15), (26.996233017, 23.15))
            ThreePointArc((26.996233017, 23.15), (27.60374107, 21.002326841), (29.246233017, 19.491106725))
        make_face()
        with BuildLine():
            ThreePointArc((26.996233017, 23.15), (27.60374107, 25.297673159), (29.246233017, 26.808893275))
            ThreePointArc((29.246233017, 26.808893275), (25.248559858, 26.642491947), (23.296233017, 23.15))
            Line((23.296233017, 23.15), (26.996233017, 23.15))
        make_face()
        with BuildLine():
            ThreePointArc((23.296233017, 23.15), (25.248559858, 19.657508053), (29.246233017, 19.491106725))
            ThreePointArc((29.246233017, 19.491106725), (27.60374107, 21.002326841), (26.996233017, 23.15))
            Line((26.996233017, 23.15), (23.296233017, 23.15))
        make_face()
    extrude(amount=-CUT_EXTRUDE7_DEPTH, mode=Mode.SUBTRACT)

    # Sketch11 → Cut-Extrude8 (cut, through all)
    with BuildSketch(Plane.XY.offset(43.29)):
        with BuildLine():
            Line((-39.25, 10), (-39.25, 11))
            ThreePointArc((-39.25, 11), (-38.25, 12), (-37.25, 11))
            Line((-37.25, 11), (-37.25, 10))
            Line((-37.25, 10), (-39.25, 10))
        make_face()
    extrude(amount=-CUT_EXTRUDE8_DEPTH, mode=Mode.SUBTRACT)

    # Sketch12 → Cut-Extrude9 (cut)
    with BuildSketch(Plane(origin=(25.94, 0, 0), x_dir=(0, 0, -1), z_dir=(1, 0, 0))):
        Polygon((-42.79, -8.93619037), (-47.402449947, -14.984957869), (-43.167493301, -15.543555396), (-40.889176965, -10), align=None)
    extrude(amount=-CUT_EXTRUDE9_DEPTH, mode=Mode.SUBTRACT)

    # Sketch13 → Cut-Extrude10 (cut, two sides)
    with BuildSketch(Plane.XY.offset(43.29)) as cut_extrude10_sk:
        with BuildLine():
            Line((-29.8, 10), (-23.780440028, 10))
            Line((-23.780440028, 10), (-23.780440028, 11.102878987))
            ThreePointArc((-23.780440028, 11.102878987), (-22.780440028, 12.102878987), (-21.780440028, 11.102878987))
            Line((-21.780440028, 11.102878987), (-21.780440028, 9))
            Line((-21.780440028, 9), (-30.475963693, 9))
            Line((-30.475963693, 9), (-29.8, 10))
        make_face()
    extrude(amount=CUT_EXTRUDE10_DEPTH, mode=Mode.SUBTRACT)
    extrude(cut_extrude10_sk.sketch, amount=-CUT_EXTRUDE10_DEPTH_BACK, mode=Mode.SUBTRACT)


solid = part.part
